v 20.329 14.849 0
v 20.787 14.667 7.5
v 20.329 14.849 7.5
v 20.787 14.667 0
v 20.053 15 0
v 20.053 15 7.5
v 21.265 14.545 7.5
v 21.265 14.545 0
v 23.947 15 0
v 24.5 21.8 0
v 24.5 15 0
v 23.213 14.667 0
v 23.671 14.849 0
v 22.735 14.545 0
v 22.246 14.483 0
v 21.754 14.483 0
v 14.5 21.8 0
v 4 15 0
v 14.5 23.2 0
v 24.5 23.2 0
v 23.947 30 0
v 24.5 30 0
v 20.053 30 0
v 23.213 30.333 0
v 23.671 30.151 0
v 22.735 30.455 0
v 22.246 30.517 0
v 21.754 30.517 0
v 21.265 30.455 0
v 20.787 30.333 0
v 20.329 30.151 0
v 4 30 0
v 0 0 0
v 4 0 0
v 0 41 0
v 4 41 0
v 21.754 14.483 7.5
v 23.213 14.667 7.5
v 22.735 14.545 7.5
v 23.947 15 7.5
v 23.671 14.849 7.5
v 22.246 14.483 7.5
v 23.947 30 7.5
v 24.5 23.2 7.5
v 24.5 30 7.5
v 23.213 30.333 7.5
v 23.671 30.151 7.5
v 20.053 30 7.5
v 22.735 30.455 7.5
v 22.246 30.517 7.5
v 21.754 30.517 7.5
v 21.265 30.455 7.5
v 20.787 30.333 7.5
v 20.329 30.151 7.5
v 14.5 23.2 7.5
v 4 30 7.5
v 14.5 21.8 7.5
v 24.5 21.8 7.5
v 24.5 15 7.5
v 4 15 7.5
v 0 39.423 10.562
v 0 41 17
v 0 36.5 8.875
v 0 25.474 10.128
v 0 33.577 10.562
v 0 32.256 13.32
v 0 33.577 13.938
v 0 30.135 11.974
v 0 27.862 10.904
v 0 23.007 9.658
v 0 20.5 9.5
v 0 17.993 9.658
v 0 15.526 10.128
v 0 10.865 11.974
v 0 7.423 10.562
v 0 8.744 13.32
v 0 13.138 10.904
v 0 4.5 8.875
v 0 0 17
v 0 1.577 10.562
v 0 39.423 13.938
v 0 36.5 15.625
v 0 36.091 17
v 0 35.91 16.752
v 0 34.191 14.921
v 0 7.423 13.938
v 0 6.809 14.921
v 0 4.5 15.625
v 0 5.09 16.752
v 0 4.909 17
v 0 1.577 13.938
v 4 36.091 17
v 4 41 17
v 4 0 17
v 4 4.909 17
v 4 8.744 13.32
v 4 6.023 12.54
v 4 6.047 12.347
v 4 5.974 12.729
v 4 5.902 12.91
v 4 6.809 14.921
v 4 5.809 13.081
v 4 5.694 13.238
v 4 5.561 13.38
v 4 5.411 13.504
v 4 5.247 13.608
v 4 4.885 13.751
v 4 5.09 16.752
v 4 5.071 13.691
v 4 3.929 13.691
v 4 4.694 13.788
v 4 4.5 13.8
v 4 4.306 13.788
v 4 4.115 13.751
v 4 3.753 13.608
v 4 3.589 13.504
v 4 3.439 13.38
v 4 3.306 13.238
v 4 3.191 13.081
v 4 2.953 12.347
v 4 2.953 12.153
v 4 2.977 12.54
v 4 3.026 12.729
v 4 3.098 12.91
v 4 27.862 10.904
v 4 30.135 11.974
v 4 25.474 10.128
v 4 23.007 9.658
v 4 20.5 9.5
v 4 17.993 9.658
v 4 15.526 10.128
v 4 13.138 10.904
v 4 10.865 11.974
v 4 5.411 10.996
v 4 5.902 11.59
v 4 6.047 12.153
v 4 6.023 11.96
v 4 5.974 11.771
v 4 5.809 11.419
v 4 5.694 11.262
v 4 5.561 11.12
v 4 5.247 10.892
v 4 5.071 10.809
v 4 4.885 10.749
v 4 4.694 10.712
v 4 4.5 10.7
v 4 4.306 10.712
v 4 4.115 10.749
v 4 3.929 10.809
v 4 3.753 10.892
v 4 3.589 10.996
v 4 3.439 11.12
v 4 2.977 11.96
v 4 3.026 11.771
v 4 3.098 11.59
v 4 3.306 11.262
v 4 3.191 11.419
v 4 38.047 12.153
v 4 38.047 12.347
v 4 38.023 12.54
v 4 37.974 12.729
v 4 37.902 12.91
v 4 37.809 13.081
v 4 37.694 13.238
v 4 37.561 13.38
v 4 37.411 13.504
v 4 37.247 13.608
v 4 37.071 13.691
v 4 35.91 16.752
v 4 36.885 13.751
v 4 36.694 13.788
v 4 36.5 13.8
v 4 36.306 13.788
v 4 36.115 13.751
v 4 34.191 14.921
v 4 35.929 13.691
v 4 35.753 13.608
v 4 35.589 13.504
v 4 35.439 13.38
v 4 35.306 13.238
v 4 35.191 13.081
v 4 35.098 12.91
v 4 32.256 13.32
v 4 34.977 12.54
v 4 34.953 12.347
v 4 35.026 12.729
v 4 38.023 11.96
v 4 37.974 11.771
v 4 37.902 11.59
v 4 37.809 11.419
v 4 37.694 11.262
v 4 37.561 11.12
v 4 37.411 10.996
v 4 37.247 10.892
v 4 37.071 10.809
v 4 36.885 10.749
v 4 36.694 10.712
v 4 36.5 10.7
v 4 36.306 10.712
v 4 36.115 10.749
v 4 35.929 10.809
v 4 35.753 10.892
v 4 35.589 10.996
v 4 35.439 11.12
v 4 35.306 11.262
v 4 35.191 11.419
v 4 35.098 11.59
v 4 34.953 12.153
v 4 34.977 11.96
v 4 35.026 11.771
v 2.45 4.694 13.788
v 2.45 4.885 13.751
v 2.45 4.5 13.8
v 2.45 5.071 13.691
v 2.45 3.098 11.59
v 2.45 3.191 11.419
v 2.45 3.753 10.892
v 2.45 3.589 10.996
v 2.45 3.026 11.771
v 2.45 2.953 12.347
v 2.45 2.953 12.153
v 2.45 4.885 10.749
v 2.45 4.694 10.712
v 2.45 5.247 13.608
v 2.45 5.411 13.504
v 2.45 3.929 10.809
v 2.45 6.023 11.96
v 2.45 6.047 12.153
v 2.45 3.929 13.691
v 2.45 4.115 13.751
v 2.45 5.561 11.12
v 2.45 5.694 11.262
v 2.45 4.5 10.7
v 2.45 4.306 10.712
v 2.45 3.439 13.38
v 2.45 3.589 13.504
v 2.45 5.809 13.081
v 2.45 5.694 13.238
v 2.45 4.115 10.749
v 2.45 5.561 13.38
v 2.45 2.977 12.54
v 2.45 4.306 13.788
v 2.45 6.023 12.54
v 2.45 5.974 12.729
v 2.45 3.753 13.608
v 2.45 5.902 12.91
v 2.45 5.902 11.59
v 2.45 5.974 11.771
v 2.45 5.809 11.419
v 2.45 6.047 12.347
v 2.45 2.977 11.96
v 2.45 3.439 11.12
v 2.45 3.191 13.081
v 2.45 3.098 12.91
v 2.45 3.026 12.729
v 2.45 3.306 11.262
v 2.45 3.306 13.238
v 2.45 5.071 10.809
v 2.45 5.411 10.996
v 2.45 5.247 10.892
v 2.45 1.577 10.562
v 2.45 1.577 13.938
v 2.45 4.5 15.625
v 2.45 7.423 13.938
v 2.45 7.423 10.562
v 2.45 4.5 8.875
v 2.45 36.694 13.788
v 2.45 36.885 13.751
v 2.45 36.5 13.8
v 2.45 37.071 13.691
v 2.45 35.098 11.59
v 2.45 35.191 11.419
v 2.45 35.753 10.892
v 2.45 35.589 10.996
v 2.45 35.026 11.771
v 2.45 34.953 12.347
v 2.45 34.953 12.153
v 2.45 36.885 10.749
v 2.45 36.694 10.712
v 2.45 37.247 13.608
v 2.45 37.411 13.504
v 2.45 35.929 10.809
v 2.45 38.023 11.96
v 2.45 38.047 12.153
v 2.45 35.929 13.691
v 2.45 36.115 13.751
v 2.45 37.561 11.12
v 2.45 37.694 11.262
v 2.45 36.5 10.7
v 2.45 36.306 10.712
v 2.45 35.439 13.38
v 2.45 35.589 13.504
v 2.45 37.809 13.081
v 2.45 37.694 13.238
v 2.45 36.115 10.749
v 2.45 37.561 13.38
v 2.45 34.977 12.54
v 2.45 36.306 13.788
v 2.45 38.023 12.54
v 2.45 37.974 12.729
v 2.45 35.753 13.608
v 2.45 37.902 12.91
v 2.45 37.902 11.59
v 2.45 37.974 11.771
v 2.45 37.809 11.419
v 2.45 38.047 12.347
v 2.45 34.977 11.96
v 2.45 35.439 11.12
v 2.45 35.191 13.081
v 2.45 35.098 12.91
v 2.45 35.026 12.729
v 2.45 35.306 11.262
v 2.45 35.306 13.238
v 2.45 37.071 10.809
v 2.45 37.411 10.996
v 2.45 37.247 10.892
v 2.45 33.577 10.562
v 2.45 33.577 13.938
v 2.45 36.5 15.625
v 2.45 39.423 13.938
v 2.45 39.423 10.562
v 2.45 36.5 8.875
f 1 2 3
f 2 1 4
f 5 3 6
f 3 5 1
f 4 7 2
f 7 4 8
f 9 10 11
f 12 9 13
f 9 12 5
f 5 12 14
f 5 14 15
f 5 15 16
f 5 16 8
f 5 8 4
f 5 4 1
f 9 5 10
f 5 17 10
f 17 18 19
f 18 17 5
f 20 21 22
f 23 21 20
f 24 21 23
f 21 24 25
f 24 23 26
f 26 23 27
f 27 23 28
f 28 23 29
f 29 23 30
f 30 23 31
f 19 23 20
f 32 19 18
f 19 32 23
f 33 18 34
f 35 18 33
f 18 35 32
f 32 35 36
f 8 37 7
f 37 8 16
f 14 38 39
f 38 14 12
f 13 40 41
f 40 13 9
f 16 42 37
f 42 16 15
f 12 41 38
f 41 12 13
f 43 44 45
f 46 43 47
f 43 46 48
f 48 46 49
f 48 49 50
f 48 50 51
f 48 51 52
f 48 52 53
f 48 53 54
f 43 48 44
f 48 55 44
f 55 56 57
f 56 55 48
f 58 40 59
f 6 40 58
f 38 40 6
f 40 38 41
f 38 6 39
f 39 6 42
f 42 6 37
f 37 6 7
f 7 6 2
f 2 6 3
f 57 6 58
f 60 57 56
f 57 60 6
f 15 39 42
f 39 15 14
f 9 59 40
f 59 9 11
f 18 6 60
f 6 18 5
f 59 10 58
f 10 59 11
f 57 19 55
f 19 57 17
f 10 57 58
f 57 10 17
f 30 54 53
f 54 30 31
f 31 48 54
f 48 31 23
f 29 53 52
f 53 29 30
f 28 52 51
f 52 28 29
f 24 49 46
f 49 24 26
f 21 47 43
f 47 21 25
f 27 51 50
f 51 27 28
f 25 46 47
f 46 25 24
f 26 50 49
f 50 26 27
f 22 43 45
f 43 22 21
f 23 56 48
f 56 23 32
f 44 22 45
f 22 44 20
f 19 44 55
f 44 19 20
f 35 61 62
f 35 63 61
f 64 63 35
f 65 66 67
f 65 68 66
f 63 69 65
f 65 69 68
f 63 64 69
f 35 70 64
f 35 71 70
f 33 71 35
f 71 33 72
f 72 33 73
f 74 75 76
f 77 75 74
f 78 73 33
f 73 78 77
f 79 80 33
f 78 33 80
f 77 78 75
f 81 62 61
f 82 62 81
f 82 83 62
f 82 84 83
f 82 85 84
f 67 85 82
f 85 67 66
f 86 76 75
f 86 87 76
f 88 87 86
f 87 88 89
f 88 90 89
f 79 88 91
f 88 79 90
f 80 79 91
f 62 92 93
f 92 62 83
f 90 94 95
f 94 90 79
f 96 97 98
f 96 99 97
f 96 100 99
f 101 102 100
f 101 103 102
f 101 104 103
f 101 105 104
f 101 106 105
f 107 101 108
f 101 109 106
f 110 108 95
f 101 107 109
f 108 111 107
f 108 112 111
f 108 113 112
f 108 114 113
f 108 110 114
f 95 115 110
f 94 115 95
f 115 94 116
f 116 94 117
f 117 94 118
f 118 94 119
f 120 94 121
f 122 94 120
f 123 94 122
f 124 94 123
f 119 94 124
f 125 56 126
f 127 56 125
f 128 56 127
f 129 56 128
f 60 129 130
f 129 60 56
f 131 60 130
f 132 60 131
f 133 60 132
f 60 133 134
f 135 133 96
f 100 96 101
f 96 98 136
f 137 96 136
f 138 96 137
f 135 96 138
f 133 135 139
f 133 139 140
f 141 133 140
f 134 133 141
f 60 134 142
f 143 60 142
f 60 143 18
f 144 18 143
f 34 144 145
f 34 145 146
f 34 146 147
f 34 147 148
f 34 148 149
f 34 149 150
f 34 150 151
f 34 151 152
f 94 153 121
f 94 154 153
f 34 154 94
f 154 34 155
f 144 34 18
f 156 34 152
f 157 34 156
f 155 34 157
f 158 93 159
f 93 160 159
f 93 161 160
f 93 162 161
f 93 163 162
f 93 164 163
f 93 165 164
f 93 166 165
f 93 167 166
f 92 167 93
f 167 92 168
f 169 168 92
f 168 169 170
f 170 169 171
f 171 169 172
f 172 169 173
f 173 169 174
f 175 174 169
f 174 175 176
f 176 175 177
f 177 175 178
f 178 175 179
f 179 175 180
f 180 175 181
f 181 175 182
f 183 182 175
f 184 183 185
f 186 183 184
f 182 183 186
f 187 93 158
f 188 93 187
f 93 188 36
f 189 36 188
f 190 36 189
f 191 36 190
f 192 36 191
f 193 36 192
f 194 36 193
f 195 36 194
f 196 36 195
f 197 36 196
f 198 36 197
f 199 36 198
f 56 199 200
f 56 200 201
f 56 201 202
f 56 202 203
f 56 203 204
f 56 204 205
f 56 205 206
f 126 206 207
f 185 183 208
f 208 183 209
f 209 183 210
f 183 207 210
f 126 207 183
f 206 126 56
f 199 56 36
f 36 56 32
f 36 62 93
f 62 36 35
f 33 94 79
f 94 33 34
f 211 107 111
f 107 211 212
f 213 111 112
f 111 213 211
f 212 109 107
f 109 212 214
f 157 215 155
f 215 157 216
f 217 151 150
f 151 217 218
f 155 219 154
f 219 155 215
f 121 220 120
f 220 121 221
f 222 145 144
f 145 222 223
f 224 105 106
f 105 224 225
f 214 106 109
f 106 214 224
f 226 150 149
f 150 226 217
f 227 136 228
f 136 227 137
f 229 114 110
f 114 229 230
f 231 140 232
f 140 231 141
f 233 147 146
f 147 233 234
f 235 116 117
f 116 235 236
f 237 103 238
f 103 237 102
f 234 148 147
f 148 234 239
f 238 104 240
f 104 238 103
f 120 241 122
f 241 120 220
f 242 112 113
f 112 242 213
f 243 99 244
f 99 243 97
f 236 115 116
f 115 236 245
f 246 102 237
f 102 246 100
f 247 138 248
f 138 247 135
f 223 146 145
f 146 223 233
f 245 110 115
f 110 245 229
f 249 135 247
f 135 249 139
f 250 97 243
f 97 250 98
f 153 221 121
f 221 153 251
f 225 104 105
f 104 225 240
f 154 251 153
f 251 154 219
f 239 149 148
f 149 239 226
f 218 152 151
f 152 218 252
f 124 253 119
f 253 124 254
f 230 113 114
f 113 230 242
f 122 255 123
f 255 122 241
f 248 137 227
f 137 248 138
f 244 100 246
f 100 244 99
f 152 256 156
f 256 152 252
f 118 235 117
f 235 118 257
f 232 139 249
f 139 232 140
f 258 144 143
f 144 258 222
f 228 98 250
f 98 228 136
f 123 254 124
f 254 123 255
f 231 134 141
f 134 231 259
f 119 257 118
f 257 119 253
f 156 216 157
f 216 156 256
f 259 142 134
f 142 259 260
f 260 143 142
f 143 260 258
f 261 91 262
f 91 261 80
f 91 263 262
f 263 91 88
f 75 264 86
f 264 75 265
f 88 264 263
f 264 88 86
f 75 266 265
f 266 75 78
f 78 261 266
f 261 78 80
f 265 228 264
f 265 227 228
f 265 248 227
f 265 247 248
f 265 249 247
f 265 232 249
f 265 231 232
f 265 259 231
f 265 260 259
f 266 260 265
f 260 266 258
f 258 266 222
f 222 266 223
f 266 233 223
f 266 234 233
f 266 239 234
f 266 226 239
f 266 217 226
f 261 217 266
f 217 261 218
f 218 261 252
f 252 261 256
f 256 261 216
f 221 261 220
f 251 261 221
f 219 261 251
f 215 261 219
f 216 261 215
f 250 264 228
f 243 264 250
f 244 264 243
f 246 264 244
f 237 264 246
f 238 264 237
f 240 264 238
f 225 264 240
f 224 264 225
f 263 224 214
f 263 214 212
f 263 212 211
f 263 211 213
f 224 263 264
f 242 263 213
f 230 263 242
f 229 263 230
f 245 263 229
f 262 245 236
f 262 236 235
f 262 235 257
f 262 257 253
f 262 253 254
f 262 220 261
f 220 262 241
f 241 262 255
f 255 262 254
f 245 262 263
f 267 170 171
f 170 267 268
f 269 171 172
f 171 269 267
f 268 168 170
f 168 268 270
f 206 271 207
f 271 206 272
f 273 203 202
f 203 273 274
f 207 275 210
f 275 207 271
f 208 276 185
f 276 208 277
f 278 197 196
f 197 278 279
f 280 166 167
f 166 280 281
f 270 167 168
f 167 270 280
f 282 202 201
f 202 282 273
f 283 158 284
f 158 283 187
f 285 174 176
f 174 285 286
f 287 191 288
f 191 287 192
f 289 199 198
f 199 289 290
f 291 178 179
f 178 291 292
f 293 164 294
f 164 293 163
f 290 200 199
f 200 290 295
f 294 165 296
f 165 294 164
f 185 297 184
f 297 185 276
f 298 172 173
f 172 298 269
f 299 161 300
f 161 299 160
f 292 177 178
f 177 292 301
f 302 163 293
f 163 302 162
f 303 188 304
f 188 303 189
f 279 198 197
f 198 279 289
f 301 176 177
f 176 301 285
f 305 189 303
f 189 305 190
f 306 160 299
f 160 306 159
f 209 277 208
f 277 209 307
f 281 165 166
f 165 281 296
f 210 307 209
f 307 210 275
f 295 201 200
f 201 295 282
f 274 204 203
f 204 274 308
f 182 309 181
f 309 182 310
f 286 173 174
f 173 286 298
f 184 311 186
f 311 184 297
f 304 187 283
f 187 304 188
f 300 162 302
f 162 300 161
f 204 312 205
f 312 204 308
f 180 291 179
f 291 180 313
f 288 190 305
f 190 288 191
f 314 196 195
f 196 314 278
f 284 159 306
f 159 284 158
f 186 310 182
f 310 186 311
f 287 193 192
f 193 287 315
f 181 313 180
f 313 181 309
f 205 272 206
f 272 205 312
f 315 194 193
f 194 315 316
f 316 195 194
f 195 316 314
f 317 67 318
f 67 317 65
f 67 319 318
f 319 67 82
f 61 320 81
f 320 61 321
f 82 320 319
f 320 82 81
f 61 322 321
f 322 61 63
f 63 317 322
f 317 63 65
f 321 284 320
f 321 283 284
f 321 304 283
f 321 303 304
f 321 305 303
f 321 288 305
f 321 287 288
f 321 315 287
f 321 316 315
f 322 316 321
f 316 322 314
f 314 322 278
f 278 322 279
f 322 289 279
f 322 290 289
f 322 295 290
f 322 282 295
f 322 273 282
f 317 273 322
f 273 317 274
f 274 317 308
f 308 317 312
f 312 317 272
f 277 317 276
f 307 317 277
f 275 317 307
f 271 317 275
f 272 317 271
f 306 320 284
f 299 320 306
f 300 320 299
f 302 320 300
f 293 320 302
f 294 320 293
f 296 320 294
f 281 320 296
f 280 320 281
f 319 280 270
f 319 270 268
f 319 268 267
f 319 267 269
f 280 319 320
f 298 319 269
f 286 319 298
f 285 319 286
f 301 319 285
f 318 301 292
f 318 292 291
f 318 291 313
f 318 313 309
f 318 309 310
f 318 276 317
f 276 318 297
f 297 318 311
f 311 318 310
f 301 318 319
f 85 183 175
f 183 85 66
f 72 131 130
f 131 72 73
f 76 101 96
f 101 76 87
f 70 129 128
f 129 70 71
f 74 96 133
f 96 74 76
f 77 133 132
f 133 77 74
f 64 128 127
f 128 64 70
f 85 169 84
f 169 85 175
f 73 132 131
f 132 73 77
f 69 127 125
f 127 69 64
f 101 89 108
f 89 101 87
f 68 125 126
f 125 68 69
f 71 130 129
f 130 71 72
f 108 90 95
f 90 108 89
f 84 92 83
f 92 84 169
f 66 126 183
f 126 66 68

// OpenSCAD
//RAMPS fan mount for 1515 Mini Kossel

//smoothing of curves
$fn=50;

//extra dimension to remove ambiguity of walls
ex=0.10;

//aluminium extrusion dimension
profile=15;

//fan dimensions
fan=40;
fanWidth=10.5; 
fanScrewPosition=16;

//dimensions
thickness=4;
edgeWidth=2;
screwDiameter=3.1;
screwHeadDiameter=5.5; 
screwHeadHeight=3; 
nutHeight=2.25+ex;
clampWidth=7.5;
width=screwHeadDiameter + 2*edgeWidth;
shorten=4;
length=3*profile-shorten;

//ENTRY POINT
ramps_fan_mount();

module ramps_fan_mount(){
    translate([thickness, 0, width+clampWidth]) rotate([0,180,0]){
    //profileMount();
    fanBracket();
    }
    
}

module profileMount(){
    
    difference(){
        cube([profile+fanWidth, thickness, width]);
        translate([profile/2, -ex, width/2]) rotate([-90,0,0])
            union(){
                cylinder(d=screwHeadDiameter+2*ex, h=screwHeadHeight+2*ex);
                cylinder(d=screwDiameter, h=thickness+2*ex);
            }
    }
}

module fanBracket(){
    difference(){
        union(){
            cube([thickness, length, width+clampWidth]);
            translate([-fanWidth, profile, width]) 
                cube([fanWidth, profile, clampWidth]);
            translate([-fanWidth, profile, width]) rotate([0, -90, 0])
                clampClip();
            translate([-fanWidth, 2*profile, width+clampWidth]) rotate([0, 90, 180])
                clampClip();
        }
        translate([-ex, length/2-fanScrewPosition, width/2]) rotate([0,90,0])
            nutTrap();
        translate([-ex, length/2+fanScrewPosition, width/2]) rotate([0,90,0])
            nutTrap();
        translate([-ex, length/2, width-edgeWidth-fan/2]) rotate([0,90,0])
            cylinder(d=fan, h=thickness+2*ex);
    }
}

module nutTrap(){
    union(){
        cylinder(d=screwDiameter, h=thickness+2*ex);
        translate([0,0, thickness-nutHeight])  M3nut(nutHeight+2*ex);
    }
}

module M3nut(nh=nutHeight){
    cylinder(r = 5.5 / 2 / cos(180 / 6) + 2*ex, h=nh, $fn=6);
}

module clampClip(clipWidth=3, clipHeight=0.35){
    cube([clampWidth, clampWidth-2*clipHeight, 2/3*profile]);
    //new clip design
    difference(){
        translate ([0, (clampWidth - 2*clipHeight)/2,1/2*profile]) 
            rotate([0, 90,0]) cylinder(h=clampWidth, d=clampWidth + clipHeight);
        translate ([0-ex, 0, 0]) cube([clampWidth+2*ex, clampWidth, profile]);
    }
}
